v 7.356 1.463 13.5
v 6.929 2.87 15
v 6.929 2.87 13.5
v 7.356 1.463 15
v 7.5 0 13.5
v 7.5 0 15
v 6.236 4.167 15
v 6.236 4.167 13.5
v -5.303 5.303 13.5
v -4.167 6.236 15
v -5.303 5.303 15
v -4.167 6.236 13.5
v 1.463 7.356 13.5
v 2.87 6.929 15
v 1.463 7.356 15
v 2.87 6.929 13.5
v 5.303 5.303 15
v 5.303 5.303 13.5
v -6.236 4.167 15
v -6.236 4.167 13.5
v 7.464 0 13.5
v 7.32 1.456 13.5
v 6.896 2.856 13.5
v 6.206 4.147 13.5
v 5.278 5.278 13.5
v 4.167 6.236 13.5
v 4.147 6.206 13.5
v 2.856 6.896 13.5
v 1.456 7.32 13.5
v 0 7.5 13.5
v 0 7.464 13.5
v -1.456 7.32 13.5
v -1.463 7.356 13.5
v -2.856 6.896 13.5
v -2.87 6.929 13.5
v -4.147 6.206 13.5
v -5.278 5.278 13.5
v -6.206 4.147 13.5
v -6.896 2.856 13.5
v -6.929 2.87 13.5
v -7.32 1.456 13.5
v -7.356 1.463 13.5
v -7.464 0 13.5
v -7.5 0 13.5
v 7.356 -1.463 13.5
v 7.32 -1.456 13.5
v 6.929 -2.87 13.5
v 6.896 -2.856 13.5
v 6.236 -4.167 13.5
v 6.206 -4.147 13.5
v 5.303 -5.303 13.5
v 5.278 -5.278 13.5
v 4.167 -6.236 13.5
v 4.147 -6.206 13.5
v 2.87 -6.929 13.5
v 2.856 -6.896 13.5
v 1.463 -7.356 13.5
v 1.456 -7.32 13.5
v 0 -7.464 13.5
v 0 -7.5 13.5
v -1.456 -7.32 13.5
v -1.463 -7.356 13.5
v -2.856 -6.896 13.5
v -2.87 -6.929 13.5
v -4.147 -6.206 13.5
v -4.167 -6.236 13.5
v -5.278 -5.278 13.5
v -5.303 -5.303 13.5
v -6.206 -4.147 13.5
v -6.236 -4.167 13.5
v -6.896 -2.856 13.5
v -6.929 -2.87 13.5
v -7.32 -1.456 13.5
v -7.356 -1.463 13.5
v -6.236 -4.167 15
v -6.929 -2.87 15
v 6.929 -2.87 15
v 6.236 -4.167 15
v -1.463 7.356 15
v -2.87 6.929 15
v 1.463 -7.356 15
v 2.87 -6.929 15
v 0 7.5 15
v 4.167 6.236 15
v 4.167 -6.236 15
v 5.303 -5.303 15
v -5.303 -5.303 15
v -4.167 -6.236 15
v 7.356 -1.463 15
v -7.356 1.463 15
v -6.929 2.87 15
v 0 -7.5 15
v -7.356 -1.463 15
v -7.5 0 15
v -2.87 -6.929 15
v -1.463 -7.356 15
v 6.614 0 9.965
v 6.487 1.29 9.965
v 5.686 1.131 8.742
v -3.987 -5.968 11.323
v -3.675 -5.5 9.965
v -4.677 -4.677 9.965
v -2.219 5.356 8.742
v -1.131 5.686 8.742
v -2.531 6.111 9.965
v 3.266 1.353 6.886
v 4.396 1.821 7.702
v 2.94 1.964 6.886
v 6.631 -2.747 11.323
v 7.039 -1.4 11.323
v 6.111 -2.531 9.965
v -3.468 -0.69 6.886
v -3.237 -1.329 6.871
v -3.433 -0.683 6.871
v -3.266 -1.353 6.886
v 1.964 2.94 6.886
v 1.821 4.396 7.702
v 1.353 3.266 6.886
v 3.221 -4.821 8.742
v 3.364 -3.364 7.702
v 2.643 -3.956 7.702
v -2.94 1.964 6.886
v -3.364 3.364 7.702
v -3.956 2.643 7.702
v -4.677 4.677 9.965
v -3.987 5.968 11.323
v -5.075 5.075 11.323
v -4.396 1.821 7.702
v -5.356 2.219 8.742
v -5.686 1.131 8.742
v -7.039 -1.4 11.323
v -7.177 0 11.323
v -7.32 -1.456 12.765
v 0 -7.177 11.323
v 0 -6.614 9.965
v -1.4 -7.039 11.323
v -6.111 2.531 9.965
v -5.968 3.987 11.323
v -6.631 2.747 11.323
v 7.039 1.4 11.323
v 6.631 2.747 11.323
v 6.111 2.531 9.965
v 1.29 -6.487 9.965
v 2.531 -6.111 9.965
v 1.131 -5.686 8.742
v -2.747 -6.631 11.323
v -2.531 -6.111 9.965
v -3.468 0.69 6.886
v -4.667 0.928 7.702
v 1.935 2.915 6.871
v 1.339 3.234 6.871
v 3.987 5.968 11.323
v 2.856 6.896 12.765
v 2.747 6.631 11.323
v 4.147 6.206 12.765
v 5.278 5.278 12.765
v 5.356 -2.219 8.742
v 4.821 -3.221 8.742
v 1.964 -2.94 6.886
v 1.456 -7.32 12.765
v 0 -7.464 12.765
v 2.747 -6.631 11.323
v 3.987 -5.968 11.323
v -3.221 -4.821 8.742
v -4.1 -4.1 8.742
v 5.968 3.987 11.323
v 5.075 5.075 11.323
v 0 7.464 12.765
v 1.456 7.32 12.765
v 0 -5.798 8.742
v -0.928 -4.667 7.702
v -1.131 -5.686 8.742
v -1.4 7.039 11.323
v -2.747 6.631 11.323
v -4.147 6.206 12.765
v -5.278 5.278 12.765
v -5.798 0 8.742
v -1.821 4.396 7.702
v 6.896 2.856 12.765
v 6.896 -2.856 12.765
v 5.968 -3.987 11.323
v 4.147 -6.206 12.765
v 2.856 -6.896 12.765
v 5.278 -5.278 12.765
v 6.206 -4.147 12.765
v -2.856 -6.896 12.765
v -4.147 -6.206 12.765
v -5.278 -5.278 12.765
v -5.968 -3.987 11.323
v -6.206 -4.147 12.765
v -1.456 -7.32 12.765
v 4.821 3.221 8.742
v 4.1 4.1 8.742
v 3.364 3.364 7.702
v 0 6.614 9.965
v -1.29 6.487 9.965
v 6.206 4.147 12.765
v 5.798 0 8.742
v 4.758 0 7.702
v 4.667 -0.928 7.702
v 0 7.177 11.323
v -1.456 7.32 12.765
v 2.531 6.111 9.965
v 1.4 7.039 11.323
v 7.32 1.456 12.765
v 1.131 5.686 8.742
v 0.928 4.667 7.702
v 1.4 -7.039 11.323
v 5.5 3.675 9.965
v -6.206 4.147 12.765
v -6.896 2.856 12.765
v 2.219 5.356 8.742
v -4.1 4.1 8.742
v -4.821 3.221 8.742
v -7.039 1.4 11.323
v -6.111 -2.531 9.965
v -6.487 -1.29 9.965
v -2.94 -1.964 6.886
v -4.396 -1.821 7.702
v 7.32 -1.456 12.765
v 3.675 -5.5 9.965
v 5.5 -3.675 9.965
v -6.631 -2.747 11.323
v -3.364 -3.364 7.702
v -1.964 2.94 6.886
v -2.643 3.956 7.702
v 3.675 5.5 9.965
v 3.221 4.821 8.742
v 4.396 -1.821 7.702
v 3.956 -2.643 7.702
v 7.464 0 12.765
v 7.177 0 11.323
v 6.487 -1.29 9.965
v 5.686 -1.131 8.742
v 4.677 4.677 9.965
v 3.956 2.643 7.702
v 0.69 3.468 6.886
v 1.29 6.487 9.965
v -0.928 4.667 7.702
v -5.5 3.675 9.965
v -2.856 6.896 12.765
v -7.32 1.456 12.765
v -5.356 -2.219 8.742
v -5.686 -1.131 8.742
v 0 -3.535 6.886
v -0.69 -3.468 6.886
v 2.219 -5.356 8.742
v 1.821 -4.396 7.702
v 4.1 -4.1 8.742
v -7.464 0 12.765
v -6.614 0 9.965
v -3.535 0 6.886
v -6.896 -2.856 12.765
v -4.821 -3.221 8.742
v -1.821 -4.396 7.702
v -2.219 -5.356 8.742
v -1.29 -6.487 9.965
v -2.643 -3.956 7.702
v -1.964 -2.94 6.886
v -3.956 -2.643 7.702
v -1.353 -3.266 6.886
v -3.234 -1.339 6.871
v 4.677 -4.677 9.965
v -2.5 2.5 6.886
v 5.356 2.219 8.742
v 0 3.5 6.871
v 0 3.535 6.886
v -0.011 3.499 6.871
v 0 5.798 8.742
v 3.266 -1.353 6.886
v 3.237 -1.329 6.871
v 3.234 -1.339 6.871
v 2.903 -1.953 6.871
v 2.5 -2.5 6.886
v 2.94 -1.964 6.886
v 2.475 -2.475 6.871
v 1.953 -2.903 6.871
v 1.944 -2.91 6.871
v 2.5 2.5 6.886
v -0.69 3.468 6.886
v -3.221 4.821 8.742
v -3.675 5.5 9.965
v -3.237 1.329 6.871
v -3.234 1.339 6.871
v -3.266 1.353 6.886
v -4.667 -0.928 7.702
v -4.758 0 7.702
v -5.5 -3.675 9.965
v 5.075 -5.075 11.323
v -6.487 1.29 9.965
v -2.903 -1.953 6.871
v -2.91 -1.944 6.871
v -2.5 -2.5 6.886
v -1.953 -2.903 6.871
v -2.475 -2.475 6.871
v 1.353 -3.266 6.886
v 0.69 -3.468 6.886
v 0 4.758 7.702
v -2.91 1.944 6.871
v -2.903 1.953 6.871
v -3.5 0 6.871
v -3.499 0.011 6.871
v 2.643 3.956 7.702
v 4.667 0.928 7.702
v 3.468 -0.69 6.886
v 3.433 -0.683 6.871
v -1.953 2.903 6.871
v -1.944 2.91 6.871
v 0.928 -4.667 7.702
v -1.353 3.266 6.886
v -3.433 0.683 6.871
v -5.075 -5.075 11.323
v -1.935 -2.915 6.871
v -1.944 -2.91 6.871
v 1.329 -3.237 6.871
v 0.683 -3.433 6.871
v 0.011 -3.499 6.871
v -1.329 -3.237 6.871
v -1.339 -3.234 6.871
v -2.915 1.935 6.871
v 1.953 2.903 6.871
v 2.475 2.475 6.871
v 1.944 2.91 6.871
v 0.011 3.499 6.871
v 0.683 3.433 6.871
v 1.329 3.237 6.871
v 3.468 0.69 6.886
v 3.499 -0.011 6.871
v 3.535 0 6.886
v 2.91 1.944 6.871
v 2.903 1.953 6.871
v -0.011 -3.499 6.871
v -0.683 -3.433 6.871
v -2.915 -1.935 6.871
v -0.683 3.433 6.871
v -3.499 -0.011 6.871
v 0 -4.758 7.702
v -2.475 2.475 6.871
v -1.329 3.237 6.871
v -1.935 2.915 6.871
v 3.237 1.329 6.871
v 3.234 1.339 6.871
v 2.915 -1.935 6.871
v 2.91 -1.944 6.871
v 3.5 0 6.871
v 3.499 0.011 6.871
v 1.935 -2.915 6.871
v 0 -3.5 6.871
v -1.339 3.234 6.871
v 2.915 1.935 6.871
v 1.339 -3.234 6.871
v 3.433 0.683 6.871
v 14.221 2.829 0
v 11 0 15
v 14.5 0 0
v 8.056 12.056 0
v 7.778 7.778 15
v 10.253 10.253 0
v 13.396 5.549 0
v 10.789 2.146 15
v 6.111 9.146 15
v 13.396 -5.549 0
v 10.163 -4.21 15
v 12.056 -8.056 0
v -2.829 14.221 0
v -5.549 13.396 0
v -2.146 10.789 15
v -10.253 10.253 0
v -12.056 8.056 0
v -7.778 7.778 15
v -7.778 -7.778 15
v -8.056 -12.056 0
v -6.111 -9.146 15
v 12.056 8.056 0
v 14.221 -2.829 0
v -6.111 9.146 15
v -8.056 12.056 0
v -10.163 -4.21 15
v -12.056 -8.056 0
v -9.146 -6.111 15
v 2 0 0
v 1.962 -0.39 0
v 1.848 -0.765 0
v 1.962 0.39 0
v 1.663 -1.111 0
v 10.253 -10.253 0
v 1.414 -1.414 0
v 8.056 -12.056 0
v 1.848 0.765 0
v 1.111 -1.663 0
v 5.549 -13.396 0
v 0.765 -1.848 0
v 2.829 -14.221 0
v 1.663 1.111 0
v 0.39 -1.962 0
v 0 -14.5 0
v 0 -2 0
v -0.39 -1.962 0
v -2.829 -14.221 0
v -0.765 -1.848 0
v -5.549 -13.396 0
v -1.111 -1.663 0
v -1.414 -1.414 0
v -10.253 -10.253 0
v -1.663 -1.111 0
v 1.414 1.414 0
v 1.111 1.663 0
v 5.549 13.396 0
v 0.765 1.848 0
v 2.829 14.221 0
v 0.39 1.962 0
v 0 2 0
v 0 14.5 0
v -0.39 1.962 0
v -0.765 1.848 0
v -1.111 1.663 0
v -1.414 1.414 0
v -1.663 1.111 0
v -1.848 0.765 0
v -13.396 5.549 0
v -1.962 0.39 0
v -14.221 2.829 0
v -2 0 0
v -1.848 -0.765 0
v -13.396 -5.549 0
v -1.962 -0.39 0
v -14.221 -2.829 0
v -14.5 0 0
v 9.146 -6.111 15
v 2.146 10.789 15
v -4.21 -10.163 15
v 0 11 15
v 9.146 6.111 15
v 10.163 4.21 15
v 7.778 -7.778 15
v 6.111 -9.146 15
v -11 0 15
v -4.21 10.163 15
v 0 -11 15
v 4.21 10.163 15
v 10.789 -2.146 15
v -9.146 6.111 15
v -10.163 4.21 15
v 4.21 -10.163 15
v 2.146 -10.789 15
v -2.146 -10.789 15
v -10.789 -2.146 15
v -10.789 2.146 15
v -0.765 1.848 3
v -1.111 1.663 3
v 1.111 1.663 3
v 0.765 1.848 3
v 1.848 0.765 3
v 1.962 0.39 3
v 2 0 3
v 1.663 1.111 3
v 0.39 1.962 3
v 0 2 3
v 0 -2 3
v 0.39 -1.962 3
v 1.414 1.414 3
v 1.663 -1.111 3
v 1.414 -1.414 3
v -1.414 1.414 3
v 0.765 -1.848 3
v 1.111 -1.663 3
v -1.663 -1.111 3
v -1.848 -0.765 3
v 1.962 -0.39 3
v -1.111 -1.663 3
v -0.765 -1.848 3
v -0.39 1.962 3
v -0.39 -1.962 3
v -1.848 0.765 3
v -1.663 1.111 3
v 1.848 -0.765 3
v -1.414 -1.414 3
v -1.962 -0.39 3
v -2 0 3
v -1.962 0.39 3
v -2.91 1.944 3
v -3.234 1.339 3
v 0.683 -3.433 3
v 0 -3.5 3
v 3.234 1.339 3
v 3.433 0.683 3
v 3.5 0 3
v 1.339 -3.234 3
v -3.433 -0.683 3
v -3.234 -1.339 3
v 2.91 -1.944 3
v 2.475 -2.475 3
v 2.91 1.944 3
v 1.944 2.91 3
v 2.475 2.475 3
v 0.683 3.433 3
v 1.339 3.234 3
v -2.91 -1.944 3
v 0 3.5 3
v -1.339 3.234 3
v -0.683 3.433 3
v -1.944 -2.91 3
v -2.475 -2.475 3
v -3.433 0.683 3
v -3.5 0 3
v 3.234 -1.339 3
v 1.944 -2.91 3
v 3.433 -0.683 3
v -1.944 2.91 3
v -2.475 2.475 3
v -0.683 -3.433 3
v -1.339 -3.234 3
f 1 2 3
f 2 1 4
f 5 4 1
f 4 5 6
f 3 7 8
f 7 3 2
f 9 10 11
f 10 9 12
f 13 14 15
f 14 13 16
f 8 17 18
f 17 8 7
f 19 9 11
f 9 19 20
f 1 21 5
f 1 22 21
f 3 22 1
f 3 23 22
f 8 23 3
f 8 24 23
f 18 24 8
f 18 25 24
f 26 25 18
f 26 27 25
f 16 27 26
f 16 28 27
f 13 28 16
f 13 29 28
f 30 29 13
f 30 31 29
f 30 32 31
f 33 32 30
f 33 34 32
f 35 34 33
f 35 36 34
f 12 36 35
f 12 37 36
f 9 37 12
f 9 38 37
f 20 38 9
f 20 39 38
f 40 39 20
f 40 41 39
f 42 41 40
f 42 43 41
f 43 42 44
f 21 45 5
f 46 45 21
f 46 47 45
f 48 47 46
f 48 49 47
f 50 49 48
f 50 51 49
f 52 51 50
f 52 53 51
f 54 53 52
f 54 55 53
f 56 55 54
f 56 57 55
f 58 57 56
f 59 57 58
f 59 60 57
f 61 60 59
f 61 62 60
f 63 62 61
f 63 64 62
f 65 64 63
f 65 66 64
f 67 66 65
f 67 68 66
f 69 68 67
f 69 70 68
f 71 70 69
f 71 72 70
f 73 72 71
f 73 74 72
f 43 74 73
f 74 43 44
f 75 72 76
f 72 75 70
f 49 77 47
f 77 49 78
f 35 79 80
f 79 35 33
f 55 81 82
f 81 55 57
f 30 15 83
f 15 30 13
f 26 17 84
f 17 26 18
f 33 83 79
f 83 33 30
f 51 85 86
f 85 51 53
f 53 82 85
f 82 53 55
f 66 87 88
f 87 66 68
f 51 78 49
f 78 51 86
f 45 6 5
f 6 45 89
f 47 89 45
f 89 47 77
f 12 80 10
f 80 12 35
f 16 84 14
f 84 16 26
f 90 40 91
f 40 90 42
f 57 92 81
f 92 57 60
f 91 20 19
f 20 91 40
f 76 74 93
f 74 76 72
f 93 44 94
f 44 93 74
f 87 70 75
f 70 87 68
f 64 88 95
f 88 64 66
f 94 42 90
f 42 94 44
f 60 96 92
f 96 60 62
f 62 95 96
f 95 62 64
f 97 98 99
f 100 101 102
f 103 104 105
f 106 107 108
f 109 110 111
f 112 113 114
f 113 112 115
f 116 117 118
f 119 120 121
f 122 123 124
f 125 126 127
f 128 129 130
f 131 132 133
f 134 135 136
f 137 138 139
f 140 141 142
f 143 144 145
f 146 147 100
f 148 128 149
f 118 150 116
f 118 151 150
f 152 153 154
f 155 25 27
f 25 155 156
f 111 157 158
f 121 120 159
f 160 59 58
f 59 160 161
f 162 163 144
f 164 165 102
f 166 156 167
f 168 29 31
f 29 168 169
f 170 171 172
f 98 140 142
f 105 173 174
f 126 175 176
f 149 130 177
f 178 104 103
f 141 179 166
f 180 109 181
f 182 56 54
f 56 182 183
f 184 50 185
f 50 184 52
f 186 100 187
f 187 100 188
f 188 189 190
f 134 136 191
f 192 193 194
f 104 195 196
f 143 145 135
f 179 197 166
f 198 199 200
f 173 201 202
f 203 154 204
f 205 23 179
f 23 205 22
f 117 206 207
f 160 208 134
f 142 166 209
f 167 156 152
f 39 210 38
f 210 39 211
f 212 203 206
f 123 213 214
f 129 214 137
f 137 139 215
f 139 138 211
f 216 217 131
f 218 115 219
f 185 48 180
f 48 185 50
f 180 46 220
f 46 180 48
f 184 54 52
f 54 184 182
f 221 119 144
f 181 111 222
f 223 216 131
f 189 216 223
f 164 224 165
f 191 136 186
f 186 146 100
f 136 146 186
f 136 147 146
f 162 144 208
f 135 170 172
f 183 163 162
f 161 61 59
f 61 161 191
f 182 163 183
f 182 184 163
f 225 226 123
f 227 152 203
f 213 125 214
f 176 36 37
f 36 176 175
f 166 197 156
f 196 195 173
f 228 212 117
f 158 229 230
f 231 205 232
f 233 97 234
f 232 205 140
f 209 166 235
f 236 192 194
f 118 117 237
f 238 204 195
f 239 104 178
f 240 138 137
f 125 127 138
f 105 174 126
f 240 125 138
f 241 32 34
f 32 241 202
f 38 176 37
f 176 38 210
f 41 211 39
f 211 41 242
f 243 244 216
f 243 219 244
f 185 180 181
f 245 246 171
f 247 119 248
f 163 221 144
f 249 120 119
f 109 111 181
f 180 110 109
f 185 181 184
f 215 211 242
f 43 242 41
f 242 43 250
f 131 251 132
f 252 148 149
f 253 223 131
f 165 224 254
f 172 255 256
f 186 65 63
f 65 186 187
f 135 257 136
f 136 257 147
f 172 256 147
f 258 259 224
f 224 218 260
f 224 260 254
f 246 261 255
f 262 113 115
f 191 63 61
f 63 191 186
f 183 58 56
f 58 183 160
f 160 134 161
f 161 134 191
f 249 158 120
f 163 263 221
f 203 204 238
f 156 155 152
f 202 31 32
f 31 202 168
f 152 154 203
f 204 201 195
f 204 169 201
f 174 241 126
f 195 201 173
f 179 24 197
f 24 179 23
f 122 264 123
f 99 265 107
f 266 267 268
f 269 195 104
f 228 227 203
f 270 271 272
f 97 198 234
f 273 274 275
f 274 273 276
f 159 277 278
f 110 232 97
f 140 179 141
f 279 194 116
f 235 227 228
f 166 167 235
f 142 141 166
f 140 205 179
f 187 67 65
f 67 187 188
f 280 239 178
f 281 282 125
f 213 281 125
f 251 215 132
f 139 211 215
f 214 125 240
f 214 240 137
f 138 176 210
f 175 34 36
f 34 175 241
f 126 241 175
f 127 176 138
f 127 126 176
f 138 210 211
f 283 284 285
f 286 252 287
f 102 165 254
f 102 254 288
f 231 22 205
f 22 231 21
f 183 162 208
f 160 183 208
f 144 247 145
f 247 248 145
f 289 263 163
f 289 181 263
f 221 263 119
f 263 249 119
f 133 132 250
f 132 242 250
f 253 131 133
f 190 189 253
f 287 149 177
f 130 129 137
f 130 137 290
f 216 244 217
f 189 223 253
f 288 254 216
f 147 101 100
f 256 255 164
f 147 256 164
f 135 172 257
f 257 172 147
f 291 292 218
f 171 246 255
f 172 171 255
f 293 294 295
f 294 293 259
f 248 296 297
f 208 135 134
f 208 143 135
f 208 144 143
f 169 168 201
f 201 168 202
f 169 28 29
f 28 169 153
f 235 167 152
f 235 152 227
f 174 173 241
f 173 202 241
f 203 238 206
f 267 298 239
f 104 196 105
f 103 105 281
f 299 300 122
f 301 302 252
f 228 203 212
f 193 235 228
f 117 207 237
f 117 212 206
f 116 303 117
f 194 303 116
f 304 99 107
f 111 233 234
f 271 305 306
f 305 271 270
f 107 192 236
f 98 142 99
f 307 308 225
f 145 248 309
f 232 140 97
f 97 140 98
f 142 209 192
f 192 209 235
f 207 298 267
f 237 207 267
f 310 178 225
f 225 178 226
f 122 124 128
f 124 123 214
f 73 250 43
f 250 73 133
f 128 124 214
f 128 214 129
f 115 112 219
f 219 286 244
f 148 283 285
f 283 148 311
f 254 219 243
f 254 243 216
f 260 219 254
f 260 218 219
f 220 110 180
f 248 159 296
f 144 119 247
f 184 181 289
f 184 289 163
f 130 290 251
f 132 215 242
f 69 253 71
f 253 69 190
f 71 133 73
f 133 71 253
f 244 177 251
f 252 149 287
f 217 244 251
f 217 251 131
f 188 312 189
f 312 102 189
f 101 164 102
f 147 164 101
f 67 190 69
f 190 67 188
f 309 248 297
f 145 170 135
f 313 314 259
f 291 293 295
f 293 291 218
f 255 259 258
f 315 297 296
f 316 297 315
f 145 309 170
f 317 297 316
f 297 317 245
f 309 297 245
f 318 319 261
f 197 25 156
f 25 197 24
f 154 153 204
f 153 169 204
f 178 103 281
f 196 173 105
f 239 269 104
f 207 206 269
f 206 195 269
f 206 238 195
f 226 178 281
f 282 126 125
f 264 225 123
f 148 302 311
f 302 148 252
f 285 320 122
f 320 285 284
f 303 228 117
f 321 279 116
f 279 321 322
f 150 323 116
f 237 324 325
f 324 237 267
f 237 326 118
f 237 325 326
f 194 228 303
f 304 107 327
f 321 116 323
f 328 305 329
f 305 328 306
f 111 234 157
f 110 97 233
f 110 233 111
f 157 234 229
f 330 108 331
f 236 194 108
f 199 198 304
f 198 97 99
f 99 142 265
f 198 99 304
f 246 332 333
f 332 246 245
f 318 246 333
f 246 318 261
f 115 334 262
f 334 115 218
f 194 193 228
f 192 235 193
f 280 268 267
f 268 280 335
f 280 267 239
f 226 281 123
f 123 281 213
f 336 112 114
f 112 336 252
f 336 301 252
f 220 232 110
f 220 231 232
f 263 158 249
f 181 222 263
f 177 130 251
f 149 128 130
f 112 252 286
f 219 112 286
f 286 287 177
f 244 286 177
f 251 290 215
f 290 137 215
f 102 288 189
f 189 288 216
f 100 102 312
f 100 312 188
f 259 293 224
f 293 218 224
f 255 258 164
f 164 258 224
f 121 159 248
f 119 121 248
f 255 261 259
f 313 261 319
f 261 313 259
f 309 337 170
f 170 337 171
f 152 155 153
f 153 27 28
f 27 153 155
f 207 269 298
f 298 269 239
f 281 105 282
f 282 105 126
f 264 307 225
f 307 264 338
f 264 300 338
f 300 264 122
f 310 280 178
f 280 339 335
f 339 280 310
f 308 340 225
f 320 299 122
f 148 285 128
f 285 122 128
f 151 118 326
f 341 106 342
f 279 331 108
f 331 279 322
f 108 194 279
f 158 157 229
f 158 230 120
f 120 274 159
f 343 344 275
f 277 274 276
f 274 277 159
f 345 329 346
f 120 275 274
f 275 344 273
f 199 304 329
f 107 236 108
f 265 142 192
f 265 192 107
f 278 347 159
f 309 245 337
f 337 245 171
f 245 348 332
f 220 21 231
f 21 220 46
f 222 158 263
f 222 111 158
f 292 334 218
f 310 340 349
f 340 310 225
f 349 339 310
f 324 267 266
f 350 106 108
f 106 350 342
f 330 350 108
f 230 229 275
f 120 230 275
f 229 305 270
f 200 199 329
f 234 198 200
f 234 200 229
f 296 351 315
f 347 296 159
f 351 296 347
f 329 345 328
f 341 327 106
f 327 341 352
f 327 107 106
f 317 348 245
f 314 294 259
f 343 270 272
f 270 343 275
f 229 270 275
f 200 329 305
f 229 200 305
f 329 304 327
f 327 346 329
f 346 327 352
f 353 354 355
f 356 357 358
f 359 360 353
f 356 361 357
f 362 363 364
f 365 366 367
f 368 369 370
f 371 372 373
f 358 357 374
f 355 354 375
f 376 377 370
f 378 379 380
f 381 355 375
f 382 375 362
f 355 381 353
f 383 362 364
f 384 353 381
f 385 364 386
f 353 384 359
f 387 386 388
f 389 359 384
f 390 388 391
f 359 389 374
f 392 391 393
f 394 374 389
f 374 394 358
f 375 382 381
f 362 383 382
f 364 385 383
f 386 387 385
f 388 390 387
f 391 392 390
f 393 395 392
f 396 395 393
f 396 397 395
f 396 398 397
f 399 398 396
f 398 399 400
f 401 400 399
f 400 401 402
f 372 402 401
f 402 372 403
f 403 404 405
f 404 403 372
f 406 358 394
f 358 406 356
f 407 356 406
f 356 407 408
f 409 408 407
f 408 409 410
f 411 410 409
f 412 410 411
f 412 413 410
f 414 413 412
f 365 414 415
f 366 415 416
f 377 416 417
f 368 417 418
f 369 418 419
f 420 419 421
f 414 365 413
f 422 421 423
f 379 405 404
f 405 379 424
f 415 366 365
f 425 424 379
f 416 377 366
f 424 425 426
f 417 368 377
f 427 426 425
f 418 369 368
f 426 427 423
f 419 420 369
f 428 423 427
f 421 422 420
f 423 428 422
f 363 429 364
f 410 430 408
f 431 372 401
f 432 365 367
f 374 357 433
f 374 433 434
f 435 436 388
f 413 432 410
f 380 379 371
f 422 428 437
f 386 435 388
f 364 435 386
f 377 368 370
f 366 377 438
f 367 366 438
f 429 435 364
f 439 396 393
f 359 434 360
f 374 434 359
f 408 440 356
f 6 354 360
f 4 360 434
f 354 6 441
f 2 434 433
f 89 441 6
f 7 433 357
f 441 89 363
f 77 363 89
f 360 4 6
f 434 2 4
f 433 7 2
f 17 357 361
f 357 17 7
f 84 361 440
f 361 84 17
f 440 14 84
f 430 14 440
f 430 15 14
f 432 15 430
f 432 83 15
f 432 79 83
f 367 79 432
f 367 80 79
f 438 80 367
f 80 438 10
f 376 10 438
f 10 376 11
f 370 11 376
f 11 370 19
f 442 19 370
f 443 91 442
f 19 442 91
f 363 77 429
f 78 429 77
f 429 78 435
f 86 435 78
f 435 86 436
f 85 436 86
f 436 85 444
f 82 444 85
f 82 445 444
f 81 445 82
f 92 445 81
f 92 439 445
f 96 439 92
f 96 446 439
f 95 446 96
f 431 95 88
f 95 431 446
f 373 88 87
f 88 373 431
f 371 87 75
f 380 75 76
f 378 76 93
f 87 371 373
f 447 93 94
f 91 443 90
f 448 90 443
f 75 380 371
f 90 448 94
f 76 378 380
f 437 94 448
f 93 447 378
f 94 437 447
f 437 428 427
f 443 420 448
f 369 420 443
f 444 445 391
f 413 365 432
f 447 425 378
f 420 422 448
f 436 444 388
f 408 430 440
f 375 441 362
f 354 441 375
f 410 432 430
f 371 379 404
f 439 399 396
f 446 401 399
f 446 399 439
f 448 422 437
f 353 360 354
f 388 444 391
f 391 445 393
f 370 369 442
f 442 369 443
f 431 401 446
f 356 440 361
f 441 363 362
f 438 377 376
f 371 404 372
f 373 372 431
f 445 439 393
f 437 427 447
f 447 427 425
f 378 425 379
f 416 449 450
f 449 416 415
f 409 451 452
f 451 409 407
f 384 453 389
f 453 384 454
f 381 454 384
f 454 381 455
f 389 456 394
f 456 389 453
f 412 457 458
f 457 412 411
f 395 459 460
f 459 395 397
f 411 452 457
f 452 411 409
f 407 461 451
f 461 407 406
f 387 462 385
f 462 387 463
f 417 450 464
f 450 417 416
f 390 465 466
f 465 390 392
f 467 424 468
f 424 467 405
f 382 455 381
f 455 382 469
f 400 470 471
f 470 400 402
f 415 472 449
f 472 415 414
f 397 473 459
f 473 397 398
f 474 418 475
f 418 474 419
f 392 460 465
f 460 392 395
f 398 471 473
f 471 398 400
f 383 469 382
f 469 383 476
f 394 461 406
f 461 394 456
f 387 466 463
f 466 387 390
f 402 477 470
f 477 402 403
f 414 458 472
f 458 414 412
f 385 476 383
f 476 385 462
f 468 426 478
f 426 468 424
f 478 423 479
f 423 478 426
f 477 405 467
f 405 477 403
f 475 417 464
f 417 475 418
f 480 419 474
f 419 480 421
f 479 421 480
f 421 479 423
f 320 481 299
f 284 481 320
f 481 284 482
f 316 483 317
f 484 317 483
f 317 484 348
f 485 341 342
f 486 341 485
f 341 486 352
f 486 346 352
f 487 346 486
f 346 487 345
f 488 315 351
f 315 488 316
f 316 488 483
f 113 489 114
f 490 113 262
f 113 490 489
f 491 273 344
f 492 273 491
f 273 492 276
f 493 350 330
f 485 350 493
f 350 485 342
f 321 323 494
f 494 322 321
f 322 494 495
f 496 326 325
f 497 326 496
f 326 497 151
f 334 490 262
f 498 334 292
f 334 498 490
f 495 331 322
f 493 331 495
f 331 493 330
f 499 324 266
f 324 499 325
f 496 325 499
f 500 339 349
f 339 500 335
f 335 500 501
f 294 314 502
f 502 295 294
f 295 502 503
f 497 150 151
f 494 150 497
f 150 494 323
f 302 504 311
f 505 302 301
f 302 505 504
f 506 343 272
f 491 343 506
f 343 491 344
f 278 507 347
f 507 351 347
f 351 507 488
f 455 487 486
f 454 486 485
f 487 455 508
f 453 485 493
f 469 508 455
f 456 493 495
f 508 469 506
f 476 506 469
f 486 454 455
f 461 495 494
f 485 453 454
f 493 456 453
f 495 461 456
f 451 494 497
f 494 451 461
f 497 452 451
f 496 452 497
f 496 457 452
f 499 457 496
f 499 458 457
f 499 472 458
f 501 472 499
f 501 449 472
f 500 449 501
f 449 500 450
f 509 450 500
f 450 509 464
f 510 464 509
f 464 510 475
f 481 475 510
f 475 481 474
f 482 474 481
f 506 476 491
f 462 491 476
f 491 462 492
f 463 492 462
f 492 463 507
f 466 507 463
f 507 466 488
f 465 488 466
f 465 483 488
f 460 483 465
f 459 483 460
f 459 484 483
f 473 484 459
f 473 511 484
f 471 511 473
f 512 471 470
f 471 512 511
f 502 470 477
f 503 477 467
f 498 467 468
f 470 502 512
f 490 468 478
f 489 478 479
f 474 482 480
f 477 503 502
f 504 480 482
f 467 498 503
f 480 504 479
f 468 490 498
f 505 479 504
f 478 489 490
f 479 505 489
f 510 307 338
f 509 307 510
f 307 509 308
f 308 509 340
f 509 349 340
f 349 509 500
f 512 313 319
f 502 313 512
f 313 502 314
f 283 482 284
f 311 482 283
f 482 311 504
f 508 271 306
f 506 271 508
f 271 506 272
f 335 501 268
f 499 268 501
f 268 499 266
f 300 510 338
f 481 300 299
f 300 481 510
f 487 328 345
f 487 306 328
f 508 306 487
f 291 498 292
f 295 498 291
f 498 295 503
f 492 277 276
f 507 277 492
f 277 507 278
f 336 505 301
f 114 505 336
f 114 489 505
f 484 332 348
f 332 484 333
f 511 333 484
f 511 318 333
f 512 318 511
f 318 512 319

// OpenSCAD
$fn = 32;

difference() {
  cylinder(h = 15, d1 = 29, d2 = 22);
  translate([0, 0, 7.5 + 3 + 3]) {
    cylinder(h = 8, d = 15);
    sphere(d = 15);
  }
  translate([0, 0, -1])
    cylinder(h = 15, d = 4);
  translate([0, 0, 3])
    cylinder(h = 15, d = 7);
}
